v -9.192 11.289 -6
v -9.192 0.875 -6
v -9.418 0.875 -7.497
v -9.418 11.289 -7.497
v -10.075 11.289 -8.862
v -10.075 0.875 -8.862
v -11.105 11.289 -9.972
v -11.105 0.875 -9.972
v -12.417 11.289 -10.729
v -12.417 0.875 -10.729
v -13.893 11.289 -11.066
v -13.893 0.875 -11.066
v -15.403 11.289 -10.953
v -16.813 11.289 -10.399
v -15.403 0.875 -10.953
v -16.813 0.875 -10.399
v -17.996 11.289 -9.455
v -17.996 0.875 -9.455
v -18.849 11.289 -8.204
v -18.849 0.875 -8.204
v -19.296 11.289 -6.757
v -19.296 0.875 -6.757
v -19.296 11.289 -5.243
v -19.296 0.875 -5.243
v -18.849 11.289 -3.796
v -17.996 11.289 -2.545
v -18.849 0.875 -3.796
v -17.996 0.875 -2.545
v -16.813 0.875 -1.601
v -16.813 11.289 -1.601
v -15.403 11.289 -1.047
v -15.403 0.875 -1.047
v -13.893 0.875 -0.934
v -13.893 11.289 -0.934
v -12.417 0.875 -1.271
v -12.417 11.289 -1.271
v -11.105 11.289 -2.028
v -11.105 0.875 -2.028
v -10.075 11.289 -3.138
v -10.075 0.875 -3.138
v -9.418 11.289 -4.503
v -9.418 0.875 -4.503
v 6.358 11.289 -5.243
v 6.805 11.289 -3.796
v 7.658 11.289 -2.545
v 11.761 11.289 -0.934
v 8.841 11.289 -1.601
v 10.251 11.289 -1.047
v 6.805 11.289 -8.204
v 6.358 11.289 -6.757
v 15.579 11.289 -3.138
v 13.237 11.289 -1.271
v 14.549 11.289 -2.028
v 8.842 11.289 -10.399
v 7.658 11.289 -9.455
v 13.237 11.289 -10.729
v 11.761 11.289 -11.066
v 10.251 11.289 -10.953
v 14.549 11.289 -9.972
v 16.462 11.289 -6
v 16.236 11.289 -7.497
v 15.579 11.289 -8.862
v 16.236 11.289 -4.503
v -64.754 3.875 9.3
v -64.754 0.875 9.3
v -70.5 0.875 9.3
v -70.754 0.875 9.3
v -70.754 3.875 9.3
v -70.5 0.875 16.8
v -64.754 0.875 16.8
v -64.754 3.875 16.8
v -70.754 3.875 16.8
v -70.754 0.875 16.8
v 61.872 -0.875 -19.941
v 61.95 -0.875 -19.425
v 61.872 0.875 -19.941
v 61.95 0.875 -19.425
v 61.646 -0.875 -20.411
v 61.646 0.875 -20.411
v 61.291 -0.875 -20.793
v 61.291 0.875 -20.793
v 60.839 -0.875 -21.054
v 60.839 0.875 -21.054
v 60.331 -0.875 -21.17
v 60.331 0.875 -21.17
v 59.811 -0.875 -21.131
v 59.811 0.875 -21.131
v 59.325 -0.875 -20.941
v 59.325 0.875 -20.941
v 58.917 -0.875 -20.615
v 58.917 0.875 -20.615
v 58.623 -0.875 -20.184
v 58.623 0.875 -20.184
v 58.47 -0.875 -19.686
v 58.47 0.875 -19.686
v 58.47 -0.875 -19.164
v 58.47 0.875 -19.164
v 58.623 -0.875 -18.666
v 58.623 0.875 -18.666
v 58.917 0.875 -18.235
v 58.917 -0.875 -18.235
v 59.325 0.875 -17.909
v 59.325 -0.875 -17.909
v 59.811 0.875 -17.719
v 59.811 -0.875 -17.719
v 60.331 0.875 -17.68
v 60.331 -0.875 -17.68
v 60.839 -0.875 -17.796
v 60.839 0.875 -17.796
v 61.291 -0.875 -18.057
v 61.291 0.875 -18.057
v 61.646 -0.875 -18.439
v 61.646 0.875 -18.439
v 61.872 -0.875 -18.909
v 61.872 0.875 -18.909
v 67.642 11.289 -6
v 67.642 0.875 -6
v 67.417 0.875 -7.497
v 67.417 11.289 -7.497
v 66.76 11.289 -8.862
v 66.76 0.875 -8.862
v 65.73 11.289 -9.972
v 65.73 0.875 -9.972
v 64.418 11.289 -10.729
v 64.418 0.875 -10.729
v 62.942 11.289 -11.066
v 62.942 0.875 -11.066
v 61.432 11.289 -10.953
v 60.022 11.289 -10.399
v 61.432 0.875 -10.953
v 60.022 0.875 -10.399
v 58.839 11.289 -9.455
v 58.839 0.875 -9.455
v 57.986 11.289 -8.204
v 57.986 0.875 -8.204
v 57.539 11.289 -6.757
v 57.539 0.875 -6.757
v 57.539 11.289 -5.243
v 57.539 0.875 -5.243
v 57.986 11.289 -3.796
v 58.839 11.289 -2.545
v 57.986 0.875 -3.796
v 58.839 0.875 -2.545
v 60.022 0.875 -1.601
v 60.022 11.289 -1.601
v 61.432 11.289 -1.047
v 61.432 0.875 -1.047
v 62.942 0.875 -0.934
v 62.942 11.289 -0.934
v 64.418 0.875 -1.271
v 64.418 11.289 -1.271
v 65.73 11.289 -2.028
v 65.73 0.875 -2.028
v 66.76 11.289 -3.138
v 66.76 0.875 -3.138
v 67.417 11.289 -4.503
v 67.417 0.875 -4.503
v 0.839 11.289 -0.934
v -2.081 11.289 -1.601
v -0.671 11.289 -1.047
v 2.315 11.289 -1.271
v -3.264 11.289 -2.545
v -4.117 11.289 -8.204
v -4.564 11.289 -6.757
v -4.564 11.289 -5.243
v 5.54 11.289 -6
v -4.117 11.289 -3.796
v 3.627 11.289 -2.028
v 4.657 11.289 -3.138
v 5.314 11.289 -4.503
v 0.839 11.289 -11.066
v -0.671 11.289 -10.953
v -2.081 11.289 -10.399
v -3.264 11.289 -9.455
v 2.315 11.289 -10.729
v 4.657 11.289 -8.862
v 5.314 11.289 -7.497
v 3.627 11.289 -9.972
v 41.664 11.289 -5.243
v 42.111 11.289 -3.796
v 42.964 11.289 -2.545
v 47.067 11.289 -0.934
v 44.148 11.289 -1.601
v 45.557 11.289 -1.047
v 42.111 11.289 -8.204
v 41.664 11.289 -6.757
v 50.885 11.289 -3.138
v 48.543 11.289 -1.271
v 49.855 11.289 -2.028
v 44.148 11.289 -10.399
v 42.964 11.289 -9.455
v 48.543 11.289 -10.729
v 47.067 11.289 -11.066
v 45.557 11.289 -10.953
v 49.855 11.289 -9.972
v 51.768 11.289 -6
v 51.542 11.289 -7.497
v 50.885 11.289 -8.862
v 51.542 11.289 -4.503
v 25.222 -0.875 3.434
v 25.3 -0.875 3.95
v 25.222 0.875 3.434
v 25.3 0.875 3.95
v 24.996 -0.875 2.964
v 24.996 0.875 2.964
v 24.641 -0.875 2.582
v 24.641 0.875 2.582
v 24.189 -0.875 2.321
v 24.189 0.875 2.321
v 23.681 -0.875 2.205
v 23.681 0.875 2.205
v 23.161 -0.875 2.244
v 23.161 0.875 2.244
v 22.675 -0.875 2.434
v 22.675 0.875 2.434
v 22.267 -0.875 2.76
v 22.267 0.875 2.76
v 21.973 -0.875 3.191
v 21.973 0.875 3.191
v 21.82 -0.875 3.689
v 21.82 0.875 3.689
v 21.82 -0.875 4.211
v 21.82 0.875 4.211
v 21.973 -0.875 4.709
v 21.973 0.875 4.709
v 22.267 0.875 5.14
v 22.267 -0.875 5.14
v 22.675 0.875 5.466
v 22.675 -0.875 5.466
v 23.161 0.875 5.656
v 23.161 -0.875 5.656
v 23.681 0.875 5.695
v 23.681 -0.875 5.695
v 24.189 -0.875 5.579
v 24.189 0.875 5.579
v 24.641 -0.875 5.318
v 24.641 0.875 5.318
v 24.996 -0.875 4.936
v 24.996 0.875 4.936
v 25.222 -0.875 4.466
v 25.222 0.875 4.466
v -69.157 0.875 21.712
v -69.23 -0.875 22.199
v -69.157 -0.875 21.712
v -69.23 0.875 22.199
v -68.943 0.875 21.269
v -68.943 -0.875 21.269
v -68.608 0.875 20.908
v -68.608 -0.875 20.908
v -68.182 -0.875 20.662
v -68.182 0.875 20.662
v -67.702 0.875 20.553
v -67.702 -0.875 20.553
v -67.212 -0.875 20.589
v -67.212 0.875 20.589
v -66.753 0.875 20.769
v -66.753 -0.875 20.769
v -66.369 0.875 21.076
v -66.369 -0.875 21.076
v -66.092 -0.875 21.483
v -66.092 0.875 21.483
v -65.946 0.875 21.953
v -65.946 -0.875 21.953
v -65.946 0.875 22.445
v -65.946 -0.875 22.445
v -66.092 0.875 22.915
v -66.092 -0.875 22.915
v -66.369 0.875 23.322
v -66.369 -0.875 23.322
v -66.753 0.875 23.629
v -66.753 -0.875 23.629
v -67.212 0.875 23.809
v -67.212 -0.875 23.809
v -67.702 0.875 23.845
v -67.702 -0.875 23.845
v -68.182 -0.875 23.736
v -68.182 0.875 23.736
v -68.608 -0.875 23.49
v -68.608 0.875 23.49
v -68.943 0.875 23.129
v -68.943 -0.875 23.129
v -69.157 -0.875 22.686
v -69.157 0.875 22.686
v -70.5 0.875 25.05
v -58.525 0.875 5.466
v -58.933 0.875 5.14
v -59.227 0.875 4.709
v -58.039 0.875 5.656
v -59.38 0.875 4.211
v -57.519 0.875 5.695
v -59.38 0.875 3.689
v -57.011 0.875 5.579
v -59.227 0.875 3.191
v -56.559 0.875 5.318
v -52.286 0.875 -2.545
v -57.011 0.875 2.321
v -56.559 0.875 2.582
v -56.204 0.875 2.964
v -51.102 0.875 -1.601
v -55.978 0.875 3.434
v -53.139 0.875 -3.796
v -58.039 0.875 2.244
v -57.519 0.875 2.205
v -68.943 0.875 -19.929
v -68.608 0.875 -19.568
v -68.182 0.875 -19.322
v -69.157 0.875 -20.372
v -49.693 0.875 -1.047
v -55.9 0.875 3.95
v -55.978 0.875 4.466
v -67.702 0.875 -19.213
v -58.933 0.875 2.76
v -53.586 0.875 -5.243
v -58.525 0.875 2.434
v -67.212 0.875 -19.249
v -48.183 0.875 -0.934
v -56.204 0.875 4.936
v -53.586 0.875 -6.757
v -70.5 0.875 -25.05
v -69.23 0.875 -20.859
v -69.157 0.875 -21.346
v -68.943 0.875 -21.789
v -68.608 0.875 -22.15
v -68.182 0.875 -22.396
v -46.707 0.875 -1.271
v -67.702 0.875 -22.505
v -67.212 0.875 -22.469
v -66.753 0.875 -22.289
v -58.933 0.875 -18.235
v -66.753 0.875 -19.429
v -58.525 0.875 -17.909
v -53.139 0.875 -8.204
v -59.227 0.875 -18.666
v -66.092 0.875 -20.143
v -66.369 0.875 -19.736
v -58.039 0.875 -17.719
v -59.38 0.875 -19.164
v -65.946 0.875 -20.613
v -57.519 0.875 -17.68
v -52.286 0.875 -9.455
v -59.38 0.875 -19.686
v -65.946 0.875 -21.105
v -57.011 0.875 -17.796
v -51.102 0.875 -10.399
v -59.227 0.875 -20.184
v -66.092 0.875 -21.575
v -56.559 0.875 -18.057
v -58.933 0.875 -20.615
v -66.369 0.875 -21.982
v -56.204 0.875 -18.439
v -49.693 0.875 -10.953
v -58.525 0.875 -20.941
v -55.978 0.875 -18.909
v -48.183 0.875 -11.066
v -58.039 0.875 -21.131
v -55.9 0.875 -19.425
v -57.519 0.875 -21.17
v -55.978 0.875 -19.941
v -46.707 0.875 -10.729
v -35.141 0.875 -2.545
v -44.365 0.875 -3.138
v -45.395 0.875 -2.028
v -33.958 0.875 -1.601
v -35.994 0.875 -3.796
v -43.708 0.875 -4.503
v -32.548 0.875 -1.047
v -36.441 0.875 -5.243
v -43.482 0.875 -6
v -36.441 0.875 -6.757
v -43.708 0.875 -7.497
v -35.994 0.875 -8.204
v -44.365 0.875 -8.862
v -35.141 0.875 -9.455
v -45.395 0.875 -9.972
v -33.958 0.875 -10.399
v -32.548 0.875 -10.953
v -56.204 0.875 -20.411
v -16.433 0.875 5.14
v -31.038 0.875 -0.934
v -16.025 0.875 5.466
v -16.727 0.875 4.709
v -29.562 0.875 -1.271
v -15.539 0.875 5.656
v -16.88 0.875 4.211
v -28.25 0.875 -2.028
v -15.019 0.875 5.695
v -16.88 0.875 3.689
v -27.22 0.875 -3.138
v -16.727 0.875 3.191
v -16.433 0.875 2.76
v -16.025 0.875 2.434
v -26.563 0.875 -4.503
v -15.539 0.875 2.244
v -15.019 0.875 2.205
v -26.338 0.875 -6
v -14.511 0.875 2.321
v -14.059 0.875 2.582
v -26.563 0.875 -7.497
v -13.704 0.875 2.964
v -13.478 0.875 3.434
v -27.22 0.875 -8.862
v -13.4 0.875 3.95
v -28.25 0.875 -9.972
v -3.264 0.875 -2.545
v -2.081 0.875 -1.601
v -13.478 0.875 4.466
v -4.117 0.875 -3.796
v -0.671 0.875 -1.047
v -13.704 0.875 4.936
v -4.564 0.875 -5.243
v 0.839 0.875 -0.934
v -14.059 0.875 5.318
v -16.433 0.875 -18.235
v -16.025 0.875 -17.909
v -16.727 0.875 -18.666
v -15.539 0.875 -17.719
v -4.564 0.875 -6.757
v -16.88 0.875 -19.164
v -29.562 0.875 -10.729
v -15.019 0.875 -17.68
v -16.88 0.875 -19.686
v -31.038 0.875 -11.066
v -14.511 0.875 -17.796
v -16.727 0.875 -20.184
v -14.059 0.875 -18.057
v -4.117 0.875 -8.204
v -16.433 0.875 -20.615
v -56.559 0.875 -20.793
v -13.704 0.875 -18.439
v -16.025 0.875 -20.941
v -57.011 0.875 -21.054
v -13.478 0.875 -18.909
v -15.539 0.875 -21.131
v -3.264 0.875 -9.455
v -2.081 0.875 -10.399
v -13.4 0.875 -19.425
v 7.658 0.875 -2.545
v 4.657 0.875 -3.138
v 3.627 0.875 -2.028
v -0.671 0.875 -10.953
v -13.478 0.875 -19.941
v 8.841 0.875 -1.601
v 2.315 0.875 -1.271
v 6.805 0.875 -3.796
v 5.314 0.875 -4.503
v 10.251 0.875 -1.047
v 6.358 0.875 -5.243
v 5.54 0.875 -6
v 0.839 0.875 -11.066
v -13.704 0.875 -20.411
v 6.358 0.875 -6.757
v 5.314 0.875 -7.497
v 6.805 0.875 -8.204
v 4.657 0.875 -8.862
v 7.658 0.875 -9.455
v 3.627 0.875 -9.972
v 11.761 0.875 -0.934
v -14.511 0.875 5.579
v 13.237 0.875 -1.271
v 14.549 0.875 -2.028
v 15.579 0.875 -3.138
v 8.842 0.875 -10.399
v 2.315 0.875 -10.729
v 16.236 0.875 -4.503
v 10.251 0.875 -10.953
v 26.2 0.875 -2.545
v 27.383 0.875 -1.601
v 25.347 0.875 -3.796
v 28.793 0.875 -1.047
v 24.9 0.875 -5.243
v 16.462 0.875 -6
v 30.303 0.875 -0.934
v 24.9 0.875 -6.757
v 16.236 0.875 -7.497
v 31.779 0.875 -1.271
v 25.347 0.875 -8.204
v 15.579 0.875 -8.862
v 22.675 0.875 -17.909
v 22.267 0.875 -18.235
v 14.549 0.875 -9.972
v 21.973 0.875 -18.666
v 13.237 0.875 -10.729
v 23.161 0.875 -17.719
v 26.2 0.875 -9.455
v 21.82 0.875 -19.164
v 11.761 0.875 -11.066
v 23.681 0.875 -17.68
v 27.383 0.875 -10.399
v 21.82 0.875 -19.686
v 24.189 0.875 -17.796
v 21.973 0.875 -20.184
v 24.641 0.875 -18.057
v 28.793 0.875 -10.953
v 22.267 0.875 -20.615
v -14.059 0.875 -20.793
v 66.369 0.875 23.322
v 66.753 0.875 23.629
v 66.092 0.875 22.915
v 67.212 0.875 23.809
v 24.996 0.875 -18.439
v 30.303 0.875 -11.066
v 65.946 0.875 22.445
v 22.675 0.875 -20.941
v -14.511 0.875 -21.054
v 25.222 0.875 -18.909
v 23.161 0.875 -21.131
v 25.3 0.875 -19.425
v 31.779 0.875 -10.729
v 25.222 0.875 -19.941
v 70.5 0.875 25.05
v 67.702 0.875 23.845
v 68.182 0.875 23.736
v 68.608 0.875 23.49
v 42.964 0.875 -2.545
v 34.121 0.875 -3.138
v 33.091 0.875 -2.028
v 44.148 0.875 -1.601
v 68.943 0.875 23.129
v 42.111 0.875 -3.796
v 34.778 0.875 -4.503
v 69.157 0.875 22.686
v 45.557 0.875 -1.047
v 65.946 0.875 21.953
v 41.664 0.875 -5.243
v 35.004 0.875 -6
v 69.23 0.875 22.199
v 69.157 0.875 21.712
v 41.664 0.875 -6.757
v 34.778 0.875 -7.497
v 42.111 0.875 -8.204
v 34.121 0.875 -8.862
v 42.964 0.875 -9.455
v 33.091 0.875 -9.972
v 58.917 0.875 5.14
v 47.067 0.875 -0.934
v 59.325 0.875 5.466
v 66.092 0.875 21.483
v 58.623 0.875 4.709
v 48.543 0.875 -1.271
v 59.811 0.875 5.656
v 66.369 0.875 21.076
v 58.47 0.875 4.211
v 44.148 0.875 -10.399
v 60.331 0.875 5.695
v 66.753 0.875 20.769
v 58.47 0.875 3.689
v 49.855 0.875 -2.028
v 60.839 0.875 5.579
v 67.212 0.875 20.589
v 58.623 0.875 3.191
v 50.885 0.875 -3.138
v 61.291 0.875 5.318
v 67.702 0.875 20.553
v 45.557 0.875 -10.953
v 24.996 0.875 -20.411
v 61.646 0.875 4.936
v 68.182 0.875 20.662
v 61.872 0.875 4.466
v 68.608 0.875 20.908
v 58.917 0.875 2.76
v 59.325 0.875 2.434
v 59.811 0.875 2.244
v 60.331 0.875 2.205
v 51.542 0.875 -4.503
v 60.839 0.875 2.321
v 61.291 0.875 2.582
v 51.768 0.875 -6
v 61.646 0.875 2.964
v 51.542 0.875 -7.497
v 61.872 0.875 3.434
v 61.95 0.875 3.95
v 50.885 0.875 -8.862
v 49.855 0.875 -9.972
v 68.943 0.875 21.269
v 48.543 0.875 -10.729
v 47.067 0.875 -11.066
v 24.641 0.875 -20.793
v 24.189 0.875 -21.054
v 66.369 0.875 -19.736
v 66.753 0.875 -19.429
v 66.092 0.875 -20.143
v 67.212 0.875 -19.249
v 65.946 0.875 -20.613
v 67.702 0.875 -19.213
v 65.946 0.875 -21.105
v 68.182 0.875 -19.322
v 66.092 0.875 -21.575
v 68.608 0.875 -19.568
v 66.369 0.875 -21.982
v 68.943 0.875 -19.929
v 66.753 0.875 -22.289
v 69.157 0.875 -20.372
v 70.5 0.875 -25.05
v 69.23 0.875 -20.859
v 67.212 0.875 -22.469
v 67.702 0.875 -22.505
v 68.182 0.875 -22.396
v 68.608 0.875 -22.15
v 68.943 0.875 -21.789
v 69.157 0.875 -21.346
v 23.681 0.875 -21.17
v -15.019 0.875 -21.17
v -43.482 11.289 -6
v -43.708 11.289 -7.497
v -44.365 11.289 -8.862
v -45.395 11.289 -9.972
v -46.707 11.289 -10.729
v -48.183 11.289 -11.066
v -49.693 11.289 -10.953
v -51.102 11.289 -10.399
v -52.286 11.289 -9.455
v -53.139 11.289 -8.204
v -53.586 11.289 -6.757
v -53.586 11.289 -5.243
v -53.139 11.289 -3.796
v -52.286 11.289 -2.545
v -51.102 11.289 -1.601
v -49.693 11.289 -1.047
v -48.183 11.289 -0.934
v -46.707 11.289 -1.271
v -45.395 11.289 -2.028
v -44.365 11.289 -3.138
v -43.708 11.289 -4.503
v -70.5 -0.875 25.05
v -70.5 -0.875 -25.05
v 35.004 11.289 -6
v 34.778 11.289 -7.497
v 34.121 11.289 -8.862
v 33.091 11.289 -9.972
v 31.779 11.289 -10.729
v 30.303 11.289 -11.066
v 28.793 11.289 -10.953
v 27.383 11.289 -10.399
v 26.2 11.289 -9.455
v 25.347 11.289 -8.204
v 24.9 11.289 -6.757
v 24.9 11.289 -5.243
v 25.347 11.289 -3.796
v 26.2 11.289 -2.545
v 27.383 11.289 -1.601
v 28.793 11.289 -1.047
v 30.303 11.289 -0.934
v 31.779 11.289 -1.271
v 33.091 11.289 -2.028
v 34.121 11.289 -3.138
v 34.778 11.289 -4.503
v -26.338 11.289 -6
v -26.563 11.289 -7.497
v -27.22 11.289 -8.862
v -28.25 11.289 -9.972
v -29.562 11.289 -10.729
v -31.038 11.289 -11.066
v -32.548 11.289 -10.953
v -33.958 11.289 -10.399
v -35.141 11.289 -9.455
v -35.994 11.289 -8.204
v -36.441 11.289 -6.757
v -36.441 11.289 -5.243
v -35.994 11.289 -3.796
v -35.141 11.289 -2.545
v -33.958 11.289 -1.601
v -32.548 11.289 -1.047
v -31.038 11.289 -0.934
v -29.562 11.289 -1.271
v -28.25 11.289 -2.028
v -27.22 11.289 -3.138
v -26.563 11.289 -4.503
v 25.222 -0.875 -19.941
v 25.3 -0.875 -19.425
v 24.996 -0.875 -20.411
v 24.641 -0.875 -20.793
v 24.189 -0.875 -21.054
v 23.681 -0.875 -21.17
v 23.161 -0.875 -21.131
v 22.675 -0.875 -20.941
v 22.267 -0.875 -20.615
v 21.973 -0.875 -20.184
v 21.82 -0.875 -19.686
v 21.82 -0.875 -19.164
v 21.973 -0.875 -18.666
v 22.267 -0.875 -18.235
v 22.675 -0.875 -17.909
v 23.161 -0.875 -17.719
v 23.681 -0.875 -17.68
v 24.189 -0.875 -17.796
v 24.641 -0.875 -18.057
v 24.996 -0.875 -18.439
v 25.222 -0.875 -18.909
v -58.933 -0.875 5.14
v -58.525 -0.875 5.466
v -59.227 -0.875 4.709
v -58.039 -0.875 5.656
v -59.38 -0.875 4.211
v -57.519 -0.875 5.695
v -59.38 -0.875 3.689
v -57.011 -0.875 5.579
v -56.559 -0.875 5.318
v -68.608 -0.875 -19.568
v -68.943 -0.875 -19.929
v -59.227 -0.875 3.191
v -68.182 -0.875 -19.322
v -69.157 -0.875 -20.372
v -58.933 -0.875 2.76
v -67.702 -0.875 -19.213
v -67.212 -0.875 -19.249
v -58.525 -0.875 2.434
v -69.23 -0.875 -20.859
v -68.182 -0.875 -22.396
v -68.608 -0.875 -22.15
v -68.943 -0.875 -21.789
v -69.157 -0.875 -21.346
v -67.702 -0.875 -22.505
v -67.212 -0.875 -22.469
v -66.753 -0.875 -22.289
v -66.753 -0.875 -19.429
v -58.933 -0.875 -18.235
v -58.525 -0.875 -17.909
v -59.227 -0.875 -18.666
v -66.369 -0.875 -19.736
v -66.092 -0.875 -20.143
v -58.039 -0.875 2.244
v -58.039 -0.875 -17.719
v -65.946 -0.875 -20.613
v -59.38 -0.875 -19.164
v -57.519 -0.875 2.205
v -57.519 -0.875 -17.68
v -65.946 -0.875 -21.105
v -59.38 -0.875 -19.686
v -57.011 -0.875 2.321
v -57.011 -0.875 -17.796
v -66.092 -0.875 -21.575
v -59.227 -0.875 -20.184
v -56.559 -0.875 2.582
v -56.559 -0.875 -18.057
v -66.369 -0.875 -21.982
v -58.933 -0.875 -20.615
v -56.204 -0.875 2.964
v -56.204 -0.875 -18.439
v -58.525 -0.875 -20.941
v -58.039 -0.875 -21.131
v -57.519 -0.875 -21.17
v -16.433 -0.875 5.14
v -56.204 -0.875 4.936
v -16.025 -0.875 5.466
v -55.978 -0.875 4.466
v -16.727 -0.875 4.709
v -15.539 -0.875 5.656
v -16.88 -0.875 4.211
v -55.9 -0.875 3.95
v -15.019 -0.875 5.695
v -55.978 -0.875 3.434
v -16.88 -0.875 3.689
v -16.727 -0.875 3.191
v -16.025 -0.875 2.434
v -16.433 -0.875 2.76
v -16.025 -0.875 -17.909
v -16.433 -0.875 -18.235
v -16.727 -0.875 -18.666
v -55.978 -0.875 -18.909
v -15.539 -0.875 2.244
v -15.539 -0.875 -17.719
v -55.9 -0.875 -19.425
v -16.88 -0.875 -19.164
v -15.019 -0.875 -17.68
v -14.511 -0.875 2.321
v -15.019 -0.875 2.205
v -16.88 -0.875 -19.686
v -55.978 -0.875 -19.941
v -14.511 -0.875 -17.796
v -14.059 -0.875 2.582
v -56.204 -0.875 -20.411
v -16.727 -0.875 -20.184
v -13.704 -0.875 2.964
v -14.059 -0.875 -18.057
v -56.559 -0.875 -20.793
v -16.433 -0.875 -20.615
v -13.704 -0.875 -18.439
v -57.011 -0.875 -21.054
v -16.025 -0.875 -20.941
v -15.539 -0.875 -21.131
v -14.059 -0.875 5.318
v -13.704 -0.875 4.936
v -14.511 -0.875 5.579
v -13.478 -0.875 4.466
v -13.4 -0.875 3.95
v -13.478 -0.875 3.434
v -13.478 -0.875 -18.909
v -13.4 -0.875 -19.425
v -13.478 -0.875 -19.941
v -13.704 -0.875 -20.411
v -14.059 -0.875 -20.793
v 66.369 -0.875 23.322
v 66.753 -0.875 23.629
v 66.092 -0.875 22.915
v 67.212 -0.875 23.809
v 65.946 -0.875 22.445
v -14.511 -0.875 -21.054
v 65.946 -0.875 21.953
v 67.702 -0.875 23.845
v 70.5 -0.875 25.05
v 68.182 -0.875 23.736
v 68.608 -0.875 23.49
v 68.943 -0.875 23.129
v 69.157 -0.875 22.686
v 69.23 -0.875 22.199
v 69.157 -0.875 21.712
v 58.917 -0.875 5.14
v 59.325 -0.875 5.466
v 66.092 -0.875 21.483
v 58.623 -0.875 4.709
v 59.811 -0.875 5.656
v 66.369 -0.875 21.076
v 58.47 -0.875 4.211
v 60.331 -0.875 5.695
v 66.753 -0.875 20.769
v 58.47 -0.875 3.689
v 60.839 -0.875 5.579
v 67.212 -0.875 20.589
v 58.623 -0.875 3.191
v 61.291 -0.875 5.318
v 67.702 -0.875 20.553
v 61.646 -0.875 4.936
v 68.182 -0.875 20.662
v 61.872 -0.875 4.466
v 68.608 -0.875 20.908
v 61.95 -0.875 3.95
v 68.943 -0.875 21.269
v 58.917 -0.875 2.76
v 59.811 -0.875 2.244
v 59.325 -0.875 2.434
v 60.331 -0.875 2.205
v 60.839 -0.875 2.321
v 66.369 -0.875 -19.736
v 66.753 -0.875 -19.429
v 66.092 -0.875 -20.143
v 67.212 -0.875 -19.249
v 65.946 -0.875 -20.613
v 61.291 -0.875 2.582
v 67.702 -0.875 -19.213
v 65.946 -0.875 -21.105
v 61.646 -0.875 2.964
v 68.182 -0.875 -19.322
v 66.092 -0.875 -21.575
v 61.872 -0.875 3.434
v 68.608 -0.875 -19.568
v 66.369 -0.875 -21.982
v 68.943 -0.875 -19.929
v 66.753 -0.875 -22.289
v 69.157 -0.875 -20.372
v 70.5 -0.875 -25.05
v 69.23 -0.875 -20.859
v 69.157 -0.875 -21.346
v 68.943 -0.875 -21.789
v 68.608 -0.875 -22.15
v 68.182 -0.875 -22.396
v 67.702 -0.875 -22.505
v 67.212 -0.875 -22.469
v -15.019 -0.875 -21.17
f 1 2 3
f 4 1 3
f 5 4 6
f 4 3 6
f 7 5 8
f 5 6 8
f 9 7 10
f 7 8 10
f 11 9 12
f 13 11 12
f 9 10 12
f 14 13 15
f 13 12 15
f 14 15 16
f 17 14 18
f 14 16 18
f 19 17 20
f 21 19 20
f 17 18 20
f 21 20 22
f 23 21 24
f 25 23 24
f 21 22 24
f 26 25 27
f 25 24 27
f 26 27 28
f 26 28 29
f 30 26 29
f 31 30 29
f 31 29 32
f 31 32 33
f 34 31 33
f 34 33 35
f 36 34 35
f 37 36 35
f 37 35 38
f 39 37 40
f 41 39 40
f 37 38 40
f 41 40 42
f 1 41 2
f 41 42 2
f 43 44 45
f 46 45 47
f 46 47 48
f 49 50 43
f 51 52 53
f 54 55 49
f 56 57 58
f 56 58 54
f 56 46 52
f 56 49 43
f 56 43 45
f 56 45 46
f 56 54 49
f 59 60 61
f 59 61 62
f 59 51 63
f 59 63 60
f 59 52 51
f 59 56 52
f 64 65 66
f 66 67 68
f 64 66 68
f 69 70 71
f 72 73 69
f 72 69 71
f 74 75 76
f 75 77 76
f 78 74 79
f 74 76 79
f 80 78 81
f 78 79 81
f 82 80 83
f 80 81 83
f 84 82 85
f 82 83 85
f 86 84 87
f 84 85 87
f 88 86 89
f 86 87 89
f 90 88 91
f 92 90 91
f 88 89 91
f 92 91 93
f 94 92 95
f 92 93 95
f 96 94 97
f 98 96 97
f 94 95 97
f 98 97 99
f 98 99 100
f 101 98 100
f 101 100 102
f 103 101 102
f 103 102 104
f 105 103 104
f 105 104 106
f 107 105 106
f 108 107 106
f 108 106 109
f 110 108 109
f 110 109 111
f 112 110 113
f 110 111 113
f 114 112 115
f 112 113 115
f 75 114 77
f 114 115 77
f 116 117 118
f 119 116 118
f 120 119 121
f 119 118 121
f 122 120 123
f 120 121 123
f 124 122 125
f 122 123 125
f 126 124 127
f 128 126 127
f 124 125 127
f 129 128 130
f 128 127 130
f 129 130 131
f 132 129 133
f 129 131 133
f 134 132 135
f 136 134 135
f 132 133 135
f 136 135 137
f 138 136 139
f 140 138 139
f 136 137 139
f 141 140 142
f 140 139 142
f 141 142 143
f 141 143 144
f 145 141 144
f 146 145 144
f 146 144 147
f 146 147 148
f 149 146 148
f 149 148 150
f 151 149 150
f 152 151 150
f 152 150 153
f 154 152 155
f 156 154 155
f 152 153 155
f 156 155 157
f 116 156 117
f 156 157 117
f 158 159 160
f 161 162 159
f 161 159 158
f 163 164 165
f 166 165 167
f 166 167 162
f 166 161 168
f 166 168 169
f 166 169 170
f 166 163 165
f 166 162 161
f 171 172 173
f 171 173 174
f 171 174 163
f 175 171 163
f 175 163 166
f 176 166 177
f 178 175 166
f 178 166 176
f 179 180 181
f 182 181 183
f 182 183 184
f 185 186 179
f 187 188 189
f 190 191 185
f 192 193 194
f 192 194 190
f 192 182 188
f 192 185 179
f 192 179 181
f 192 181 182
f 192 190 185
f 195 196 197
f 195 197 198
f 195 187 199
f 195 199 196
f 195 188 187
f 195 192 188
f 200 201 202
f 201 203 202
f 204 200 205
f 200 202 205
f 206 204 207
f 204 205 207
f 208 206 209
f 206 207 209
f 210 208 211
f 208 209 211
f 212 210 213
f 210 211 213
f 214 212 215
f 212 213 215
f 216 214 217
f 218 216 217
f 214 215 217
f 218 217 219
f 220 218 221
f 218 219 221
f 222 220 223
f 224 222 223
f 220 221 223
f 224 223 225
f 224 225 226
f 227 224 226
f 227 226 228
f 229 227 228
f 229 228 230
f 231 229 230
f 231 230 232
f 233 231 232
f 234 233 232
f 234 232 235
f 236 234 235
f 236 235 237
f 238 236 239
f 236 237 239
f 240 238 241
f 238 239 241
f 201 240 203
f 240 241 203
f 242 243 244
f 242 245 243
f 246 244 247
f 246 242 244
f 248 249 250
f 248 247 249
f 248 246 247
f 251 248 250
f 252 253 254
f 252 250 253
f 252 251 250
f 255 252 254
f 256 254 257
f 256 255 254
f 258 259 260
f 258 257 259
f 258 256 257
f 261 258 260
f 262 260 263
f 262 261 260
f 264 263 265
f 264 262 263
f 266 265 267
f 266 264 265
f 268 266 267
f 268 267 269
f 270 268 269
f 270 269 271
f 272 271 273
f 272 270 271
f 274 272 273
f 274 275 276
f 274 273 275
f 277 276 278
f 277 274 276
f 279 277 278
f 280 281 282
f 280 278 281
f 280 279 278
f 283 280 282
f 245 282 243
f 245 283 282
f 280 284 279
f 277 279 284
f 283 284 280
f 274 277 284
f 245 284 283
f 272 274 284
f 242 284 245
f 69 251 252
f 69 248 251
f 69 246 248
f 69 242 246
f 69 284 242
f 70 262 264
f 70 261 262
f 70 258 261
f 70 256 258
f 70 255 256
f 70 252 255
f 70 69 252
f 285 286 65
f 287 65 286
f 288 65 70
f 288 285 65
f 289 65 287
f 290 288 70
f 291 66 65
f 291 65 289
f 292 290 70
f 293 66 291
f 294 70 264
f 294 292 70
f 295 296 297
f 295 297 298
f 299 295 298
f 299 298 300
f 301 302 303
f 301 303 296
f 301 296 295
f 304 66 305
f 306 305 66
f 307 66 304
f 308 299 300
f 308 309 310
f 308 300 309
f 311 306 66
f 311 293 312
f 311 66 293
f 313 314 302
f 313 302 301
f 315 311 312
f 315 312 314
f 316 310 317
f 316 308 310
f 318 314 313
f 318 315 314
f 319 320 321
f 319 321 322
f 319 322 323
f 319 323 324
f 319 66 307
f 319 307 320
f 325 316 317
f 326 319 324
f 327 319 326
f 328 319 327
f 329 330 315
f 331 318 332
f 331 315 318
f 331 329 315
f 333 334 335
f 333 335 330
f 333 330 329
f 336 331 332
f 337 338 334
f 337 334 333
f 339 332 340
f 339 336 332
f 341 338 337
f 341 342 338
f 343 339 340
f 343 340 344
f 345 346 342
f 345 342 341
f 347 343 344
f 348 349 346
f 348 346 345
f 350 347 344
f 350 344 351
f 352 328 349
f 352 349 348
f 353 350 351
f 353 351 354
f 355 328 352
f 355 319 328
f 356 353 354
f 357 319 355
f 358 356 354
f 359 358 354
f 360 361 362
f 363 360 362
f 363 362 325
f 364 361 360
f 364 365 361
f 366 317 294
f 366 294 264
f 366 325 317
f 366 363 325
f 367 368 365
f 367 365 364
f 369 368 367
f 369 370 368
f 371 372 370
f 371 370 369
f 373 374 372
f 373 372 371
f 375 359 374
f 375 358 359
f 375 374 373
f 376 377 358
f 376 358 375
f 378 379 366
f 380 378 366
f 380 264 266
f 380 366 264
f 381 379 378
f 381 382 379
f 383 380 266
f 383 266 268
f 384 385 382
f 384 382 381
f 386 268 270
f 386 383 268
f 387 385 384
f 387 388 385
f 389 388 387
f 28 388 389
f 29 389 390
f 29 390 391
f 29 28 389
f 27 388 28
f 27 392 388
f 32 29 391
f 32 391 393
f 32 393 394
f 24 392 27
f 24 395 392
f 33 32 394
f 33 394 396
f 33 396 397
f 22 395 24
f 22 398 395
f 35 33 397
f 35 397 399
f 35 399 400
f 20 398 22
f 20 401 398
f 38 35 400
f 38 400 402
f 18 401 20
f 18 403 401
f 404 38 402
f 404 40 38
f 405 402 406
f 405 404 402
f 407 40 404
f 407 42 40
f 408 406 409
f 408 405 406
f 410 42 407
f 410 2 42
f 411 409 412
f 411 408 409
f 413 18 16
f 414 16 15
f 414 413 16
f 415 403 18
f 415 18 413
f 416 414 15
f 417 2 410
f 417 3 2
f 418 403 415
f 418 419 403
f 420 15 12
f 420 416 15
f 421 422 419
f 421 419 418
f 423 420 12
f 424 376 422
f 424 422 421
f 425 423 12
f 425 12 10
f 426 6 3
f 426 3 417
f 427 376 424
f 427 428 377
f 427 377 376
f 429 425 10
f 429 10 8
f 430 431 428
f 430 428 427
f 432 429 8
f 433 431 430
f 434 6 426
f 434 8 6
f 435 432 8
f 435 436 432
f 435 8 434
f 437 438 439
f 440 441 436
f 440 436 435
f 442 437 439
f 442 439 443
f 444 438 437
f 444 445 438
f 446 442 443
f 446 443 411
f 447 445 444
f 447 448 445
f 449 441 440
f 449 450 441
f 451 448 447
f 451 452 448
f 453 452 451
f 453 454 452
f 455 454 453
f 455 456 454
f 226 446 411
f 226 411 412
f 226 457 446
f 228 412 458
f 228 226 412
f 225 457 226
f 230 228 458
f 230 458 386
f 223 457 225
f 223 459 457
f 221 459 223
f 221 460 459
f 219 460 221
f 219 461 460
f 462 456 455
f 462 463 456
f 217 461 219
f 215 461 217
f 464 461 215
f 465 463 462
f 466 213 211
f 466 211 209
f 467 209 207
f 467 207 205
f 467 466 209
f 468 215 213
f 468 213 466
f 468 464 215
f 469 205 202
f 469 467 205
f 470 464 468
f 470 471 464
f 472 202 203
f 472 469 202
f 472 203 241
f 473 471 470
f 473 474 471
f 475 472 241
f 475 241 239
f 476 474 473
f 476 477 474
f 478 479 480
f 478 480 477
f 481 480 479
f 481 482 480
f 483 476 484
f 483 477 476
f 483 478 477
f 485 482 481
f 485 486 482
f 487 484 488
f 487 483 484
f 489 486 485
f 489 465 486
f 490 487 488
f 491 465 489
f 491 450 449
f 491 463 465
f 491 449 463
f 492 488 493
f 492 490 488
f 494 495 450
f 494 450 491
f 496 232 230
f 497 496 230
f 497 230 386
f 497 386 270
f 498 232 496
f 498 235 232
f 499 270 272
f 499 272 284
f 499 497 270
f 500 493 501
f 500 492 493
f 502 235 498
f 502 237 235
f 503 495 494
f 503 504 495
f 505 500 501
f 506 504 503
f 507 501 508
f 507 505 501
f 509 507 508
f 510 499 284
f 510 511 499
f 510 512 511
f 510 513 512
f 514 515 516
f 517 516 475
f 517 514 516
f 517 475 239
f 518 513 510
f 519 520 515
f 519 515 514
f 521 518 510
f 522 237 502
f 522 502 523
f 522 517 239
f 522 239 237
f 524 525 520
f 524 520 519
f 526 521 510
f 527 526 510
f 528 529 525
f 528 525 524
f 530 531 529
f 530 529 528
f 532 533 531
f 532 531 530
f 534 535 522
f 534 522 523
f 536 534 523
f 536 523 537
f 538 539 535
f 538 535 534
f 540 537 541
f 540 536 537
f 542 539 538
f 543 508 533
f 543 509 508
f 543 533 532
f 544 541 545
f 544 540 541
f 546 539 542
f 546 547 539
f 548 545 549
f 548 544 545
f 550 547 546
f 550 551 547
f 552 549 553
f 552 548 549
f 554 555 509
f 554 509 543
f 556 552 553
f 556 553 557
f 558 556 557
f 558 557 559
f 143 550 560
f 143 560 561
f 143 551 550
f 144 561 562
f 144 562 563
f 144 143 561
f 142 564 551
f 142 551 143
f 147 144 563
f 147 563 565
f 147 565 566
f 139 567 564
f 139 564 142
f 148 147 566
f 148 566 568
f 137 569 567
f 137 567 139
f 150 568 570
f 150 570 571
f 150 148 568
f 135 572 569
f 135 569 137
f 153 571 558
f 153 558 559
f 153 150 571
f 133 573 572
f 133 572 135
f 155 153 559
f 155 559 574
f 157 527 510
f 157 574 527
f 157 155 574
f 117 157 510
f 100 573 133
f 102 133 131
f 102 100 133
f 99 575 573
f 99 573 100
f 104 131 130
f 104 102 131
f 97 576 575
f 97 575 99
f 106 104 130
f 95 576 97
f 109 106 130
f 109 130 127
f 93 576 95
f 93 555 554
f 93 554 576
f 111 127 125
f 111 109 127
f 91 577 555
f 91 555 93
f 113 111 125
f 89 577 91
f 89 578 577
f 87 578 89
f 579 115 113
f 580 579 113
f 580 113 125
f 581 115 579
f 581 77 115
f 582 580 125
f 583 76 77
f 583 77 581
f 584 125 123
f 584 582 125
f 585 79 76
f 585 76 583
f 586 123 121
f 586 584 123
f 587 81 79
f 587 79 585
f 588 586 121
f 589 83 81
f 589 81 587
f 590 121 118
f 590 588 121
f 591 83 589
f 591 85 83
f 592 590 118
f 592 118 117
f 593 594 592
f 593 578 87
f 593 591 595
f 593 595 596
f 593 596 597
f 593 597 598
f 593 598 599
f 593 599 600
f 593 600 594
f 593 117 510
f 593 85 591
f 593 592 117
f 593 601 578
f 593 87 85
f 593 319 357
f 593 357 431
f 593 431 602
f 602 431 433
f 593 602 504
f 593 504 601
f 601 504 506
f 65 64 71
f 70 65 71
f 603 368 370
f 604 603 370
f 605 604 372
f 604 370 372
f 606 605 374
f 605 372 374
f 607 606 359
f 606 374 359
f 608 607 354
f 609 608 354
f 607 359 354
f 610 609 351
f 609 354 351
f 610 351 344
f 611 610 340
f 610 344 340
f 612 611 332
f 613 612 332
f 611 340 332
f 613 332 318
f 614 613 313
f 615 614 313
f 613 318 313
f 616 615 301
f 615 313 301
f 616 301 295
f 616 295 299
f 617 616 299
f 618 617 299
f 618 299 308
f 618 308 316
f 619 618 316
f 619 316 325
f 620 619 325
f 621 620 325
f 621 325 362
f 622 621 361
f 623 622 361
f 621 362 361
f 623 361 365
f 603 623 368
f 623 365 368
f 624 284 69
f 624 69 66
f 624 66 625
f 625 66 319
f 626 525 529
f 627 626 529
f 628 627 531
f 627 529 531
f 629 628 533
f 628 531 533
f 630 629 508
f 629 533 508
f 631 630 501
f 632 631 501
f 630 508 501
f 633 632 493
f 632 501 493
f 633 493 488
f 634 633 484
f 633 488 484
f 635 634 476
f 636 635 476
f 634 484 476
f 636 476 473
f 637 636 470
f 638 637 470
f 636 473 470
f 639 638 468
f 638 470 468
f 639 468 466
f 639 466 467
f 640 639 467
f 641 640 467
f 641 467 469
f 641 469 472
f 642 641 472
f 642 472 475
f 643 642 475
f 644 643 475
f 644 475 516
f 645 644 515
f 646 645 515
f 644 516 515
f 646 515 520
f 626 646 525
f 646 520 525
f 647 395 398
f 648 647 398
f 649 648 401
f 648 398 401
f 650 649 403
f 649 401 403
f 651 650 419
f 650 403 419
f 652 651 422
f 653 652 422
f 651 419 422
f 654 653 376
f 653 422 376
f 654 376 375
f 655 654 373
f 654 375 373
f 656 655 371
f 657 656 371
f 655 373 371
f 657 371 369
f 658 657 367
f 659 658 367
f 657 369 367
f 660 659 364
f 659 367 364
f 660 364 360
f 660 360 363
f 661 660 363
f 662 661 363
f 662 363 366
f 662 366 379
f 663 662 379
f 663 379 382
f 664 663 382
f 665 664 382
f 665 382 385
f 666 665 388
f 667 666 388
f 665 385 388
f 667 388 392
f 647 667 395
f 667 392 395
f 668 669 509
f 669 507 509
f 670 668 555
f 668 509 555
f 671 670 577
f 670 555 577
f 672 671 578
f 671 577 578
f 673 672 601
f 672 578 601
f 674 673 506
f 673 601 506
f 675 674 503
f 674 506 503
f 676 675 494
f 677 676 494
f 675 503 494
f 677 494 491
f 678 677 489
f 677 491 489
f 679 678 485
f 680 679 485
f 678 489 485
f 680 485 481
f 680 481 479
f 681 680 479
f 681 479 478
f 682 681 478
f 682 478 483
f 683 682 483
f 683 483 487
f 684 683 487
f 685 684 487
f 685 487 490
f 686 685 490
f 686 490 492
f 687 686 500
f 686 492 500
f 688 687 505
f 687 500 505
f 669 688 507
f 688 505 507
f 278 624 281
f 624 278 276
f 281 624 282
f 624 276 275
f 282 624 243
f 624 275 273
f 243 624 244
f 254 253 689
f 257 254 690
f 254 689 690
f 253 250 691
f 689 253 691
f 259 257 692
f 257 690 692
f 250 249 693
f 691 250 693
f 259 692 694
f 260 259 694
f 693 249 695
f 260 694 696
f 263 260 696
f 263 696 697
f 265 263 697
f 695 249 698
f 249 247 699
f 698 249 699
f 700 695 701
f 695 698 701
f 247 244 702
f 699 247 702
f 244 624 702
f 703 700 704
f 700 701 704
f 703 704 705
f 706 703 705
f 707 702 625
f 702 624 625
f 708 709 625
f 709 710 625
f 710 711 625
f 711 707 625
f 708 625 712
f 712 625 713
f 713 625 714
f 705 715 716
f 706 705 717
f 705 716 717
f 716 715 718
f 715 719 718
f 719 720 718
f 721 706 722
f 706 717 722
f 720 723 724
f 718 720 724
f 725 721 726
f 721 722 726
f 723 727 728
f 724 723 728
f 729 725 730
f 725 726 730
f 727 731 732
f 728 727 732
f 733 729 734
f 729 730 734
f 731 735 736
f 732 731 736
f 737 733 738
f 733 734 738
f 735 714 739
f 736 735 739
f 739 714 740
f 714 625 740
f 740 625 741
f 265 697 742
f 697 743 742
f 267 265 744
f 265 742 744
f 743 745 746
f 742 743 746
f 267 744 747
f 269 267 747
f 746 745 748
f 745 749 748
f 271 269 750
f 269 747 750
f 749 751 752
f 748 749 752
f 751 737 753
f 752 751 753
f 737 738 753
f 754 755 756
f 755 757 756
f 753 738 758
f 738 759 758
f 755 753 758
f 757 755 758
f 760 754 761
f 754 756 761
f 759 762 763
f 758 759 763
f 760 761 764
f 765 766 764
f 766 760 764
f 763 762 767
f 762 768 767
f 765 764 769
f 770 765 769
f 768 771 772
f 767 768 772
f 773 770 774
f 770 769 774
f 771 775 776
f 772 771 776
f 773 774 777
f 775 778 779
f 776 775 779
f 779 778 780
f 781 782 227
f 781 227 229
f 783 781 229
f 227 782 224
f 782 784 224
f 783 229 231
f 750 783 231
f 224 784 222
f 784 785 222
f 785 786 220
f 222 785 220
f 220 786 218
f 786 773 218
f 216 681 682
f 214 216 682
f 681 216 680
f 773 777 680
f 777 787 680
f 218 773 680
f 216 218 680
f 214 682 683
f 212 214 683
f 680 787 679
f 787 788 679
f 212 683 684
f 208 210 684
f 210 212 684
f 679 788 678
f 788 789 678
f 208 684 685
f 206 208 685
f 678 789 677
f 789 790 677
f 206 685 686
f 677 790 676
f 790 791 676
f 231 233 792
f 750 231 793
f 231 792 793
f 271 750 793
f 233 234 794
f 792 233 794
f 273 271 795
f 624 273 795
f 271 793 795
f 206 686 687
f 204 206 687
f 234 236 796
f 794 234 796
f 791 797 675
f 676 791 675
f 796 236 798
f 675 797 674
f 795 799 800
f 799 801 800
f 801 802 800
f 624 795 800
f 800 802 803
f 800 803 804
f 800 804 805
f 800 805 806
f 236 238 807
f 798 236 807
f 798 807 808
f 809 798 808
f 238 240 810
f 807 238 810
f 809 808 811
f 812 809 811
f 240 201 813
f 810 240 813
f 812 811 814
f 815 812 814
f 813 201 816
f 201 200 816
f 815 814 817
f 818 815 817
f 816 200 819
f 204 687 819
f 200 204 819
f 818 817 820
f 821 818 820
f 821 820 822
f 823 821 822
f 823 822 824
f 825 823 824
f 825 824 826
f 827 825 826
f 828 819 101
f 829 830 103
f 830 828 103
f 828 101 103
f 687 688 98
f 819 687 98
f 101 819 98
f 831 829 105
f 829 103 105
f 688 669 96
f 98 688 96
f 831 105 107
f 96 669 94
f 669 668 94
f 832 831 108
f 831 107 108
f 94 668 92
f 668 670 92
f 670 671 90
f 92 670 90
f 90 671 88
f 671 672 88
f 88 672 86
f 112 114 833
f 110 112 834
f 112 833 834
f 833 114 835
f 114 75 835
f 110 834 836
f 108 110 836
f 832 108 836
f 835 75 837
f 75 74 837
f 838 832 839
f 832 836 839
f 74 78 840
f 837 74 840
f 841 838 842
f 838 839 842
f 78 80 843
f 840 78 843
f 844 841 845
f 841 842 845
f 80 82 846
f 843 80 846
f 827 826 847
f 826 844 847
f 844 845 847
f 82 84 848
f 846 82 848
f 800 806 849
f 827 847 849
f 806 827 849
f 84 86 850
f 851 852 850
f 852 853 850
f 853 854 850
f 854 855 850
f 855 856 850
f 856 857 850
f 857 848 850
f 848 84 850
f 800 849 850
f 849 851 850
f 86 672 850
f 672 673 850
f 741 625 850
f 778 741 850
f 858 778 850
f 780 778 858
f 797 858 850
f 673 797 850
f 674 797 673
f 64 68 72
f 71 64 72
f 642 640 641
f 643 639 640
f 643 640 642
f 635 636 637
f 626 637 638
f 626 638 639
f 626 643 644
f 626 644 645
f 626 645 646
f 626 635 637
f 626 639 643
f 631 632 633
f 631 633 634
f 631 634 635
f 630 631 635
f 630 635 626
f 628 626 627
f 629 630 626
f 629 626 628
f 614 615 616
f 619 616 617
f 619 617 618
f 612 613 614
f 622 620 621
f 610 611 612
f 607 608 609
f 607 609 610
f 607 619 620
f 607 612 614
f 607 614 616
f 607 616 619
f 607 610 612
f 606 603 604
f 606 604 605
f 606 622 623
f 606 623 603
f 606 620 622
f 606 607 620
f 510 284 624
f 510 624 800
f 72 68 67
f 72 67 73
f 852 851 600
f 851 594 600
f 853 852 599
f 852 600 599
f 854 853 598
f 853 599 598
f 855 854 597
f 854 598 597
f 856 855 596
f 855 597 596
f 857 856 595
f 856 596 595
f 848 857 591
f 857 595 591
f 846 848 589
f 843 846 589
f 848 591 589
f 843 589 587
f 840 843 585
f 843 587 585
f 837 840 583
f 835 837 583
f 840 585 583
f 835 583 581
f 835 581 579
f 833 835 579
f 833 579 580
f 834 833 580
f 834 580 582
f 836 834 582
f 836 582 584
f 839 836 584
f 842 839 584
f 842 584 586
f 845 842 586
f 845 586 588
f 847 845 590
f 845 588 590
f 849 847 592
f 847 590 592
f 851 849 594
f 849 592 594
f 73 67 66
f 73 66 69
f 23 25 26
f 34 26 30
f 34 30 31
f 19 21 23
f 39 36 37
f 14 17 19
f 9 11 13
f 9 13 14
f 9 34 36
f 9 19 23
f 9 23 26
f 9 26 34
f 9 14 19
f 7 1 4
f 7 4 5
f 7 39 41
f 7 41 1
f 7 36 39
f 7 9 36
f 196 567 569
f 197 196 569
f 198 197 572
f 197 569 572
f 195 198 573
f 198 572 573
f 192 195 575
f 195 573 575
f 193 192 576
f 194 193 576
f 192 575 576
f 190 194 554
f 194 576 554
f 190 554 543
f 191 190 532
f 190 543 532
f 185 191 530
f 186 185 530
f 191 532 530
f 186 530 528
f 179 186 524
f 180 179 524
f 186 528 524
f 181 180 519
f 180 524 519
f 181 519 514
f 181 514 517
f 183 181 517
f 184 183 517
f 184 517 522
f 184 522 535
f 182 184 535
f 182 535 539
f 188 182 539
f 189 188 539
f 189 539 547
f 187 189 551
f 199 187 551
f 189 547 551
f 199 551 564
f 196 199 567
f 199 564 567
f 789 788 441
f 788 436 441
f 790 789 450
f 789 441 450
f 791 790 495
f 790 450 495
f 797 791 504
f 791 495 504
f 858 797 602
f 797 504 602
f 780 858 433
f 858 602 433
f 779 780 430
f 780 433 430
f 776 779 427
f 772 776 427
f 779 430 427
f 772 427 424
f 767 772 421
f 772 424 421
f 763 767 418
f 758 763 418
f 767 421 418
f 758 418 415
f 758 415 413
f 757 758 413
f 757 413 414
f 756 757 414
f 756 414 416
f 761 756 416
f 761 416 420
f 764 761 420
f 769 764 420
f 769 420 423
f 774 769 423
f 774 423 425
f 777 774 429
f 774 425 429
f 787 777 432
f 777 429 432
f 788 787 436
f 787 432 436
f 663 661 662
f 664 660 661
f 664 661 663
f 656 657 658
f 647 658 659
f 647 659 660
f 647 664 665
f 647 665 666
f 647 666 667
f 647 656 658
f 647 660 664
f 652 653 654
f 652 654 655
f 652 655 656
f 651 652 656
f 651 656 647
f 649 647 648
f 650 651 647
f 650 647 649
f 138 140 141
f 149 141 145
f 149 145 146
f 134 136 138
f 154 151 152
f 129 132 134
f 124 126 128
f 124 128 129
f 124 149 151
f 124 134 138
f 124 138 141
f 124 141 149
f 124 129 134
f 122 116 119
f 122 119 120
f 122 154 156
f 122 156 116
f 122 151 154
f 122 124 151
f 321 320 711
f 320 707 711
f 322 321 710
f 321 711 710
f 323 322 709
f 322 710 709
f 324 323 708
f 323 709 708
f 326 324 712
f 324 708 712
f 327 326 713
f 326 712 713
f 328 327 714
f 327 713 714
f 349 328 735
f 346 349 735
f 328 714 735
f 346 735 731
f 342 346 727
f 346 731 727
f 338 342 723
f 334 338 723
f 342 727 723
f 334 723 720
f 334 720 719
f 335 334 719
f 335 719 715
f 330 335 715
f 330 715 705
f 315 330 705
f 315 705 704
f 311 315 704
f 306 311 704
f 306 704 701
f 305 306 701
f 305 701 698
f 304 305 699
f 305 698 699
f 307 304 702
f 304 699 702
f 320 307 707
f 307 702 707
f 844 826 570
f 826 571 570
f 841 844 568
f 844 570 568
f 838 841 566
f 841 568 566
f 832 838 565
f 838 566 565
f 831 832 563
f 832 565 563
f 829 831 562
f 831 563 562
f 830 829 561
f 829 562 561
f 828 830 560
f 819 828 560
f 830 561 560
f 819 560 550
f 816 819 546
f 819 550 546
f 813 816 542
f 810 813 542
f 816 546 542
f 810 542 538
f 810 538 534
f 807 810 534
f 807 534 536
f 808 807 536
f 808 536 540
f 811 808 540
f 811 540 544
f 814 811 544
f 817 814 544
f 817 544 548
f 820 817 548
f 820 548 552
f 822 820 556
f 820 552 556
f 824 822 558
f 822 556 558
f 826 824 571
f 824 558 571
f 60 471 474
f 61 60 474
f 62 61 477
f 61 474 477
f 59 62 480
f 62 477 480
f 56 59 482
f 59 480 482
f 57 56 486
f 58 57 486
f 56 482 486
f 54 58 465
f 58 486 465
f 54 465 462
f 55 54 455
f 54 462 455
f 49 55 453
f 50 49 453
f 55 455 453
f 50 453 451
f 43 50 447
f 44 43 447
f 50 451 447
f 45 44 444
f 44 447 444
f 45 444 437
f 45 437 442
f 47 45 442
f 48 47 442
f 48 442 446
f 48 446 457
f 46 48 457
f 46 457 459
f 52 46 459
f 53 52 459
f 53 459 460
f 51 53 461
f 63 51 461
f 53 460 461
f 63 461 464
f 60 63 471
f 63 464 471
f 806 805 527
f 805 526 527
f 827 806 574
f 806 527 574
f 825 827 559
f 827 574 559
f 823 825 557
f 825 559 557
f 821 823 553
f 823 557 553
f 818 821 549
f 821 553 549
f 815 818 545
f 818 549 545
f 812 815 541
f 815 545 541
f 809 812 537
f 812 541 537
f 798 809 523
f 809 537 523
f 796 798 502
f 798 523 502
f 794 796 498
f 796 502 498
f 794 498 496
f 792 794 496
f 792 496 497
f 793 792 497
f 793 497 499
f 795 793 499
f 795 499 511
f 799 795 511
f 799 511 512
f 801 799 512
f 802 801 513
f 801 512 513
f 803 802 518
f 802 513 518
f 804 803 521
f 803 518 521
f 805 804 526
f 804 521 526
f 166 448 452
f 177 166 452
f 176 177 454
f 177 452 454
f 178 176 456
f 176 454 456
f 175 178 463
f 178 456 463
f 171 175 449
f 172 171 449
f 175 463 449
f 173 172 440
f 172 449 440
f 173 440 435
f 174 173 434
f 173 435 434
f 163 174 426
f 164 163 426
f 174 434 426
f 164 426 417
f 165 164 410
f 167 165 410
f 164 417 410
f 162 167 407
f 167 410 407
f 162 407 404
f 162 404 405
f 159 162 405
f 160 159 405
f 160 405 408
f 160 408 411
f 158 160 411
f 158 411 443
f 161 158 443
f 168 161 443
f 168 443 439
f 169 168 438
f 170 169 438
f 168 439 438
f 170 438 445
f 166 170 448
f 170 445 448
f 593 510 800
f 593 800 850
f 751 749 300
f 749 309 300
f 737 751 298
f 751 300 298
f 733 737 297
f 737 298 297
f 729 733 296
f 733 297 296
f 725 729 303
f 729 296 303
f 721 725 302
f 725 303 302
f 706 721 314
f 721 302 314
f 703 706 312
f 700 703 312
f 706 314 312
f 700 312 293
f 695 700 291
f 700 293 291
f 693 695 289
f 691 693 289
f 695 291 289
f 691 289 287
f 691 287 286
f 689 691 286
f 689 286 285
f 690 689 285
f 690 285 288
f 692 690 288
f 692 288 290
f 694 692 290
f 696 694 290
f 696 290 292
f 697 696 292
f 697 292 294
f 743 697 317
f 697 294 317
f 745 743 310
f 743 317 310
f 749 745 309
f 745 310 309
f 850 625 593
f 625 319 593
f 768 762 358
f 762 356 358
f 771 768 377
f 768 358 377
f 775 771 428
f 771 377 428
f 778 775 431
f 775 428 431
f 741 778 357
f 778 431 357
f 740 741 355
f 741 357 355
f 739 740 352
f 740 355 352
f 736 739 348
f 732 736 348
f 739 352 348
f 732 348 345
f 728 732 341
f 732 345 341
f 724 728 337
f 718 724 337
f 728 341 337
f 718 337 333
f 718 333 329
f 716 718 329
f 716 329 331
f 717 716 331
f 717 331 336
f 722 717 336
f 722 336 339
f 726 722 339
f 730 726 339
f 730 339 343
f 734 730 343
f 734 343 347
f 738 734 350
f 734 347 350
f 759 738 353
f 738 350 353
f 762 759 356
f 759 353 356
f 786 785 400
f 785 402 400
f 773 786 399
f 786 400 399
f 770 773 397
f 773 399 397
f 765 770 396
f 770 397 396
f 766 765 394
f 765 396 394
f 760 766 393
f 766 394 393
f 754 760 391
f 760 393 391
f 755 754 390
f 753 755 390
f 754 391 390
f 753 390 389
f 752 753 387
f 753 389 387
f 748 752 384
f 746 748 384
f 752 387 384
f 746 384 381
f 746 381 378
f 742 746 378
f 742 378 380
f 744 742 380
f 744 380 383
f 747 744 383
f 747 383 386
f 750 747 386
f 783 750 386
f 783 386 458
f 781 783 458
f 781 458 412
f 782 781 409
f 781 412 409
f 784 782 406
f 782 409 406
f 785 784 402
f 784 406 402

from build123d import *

# Parameters (mm, degrees)
SKETCH1_W               = 141
SKETCH1_H               = 50.1
BOSS_EXTRUDE1_DEPTH     = 0.875
SKETCH3_R               = 1.651
CUT_EXTRUDE1_DEPTH      = 1.875
SKETCH4_R               = 1.75
CUT_EXTRUDE2_DEPTH      = 1.875
CUT_EXTRUDE2_DEPTH_BACK = 1.875
SKETCH2_R               = 5.08
BOSS_EXTRUDE2_DEPTH     = 10.414
BOSS_EXTRUDE3_START     = 0.254
SKETCH5_W               = 7.5
SKETCH5_H               = 3
BOSS_EXTRUDE3_DEPTH     = 6


with BuildPart() as part:
    # Sketch1 → Boss-Extrude1 (new body, symmetric)
    with BuildSketch(Plane(origin=(0, 0, 0), x_dir=(1, 0, 0), z_dir=(0, 1, 0))):
        Rectangle(SKETCH1_W, SKETCH1_H)
    extrude(amount=BOSS_EXTRUDE1_DEPTH, both=True)

    # Sketch3 → Cut-Extrude1 (cut, symmetric)
    with BuildSketch(Plane(origin=(0, 0, 0), x_dir=(1, 0, 0), z_dir=(0, 1, 0))):
        with Locations((67.579, 20.859)):
            Circle(SKETCH3_R)
        with Locations((67.579, -22.199)):
            Circle(SKETCH3_R)
    cut_extrude1 = extrude(amount=CUT_EXTRUDE1_DEPTH, both=True, mode=Mode.SUBTRACT)

    # Sketch4 → Cut-Extrude2 (cut, two sides)
    with BuildSketch(Plane(origin=(0, 0, 0), x_dir=(1, 0, 0), z_dir=(0, 1, 0))) as cut_extrude2_sk:
        with Locations((-57.65, 19.425)):
            Circle(SKETCH4_R)
        with Locations((-15.15, 19.425)):
            Circle(SKETCH4_R)
        with Locations((23.55, 19.425)):
            Circle(SKETCH4_R)
        with Locations((60.2, 19.425)):
            Circle(SKETCH4_R)
        with Locations((-15.15, -3.95)):
            Circle(SKETCH4_R)
        with Locations((23.55, -3.95)):
            Circle(SKETCH4_R)
        with Locations((60.2, -3.95)):
            Circle(SKETCH4_R)
        with Locations((-57.65, -3.95)):
            Circle(SKETCH4_R)
    extrude(amount=CUT_EXTRUDE2_DEPTH, mode=Mode.SUBTRACT)
    extrude(cut_extrude2_sk.sketch, amount=-CUT_EXTRUDE2_DEPTH_BACK, mode=Mode.SUBTRACT)

    # Mirror1: Cut-Extrude1 across plane
    add(cut_extrude1.mirror(Plane(origin=(0, 0, 0), x_dir=(0, 0, 1), z_dir=(1, 0, 0))), mode=Mode.SUBTRACT)

    # Sketch2 → Boss-Extrude2 (add)
    with BuildSketch(Plane(origin=(0, 0.875, 0), x_dir=(1, 0, 0), z_dir=(0, 1, 0))):
        with Locations((-48.5625, 6)):
            Circle(SKETCH2_R)
        with Locations((-31.4175, 6)):
            Circle(SKETCH2_R)
        with Locations((-14.2725, 6)):
            Circle(SKETCH2_R)
        with Locations((0.4595, 6)):
            Circle(SKETCH2_R)
        with Locations((11.3815, 6)):
            Circle(SKETCH2_R)
        with Locations((29.9235, 6)):
            Circle(SKETCH2_R)
        with Locations((46.6875, 6)):
            Circle(SKETCH2_R)
        with Locations((62.5625, 6)):
            Circle(SKETCH2_R)
    extrude(amount=BOSS_EXTRUDE2_DEPTH)

    # Sketch5 → Boss-Extrude3 (add)
    with BuildSketch(Plane.ZY.offset(70.5).offset(BOSS_EXTRUDE3_START)):
        with Locations((13.05, 2.375)):
            Rectangle(SKETCH5_W, SKETCH5_H)
    extrude(amount=-BOSS_EXTRUDE3_DEPTH)


solid = part.part
